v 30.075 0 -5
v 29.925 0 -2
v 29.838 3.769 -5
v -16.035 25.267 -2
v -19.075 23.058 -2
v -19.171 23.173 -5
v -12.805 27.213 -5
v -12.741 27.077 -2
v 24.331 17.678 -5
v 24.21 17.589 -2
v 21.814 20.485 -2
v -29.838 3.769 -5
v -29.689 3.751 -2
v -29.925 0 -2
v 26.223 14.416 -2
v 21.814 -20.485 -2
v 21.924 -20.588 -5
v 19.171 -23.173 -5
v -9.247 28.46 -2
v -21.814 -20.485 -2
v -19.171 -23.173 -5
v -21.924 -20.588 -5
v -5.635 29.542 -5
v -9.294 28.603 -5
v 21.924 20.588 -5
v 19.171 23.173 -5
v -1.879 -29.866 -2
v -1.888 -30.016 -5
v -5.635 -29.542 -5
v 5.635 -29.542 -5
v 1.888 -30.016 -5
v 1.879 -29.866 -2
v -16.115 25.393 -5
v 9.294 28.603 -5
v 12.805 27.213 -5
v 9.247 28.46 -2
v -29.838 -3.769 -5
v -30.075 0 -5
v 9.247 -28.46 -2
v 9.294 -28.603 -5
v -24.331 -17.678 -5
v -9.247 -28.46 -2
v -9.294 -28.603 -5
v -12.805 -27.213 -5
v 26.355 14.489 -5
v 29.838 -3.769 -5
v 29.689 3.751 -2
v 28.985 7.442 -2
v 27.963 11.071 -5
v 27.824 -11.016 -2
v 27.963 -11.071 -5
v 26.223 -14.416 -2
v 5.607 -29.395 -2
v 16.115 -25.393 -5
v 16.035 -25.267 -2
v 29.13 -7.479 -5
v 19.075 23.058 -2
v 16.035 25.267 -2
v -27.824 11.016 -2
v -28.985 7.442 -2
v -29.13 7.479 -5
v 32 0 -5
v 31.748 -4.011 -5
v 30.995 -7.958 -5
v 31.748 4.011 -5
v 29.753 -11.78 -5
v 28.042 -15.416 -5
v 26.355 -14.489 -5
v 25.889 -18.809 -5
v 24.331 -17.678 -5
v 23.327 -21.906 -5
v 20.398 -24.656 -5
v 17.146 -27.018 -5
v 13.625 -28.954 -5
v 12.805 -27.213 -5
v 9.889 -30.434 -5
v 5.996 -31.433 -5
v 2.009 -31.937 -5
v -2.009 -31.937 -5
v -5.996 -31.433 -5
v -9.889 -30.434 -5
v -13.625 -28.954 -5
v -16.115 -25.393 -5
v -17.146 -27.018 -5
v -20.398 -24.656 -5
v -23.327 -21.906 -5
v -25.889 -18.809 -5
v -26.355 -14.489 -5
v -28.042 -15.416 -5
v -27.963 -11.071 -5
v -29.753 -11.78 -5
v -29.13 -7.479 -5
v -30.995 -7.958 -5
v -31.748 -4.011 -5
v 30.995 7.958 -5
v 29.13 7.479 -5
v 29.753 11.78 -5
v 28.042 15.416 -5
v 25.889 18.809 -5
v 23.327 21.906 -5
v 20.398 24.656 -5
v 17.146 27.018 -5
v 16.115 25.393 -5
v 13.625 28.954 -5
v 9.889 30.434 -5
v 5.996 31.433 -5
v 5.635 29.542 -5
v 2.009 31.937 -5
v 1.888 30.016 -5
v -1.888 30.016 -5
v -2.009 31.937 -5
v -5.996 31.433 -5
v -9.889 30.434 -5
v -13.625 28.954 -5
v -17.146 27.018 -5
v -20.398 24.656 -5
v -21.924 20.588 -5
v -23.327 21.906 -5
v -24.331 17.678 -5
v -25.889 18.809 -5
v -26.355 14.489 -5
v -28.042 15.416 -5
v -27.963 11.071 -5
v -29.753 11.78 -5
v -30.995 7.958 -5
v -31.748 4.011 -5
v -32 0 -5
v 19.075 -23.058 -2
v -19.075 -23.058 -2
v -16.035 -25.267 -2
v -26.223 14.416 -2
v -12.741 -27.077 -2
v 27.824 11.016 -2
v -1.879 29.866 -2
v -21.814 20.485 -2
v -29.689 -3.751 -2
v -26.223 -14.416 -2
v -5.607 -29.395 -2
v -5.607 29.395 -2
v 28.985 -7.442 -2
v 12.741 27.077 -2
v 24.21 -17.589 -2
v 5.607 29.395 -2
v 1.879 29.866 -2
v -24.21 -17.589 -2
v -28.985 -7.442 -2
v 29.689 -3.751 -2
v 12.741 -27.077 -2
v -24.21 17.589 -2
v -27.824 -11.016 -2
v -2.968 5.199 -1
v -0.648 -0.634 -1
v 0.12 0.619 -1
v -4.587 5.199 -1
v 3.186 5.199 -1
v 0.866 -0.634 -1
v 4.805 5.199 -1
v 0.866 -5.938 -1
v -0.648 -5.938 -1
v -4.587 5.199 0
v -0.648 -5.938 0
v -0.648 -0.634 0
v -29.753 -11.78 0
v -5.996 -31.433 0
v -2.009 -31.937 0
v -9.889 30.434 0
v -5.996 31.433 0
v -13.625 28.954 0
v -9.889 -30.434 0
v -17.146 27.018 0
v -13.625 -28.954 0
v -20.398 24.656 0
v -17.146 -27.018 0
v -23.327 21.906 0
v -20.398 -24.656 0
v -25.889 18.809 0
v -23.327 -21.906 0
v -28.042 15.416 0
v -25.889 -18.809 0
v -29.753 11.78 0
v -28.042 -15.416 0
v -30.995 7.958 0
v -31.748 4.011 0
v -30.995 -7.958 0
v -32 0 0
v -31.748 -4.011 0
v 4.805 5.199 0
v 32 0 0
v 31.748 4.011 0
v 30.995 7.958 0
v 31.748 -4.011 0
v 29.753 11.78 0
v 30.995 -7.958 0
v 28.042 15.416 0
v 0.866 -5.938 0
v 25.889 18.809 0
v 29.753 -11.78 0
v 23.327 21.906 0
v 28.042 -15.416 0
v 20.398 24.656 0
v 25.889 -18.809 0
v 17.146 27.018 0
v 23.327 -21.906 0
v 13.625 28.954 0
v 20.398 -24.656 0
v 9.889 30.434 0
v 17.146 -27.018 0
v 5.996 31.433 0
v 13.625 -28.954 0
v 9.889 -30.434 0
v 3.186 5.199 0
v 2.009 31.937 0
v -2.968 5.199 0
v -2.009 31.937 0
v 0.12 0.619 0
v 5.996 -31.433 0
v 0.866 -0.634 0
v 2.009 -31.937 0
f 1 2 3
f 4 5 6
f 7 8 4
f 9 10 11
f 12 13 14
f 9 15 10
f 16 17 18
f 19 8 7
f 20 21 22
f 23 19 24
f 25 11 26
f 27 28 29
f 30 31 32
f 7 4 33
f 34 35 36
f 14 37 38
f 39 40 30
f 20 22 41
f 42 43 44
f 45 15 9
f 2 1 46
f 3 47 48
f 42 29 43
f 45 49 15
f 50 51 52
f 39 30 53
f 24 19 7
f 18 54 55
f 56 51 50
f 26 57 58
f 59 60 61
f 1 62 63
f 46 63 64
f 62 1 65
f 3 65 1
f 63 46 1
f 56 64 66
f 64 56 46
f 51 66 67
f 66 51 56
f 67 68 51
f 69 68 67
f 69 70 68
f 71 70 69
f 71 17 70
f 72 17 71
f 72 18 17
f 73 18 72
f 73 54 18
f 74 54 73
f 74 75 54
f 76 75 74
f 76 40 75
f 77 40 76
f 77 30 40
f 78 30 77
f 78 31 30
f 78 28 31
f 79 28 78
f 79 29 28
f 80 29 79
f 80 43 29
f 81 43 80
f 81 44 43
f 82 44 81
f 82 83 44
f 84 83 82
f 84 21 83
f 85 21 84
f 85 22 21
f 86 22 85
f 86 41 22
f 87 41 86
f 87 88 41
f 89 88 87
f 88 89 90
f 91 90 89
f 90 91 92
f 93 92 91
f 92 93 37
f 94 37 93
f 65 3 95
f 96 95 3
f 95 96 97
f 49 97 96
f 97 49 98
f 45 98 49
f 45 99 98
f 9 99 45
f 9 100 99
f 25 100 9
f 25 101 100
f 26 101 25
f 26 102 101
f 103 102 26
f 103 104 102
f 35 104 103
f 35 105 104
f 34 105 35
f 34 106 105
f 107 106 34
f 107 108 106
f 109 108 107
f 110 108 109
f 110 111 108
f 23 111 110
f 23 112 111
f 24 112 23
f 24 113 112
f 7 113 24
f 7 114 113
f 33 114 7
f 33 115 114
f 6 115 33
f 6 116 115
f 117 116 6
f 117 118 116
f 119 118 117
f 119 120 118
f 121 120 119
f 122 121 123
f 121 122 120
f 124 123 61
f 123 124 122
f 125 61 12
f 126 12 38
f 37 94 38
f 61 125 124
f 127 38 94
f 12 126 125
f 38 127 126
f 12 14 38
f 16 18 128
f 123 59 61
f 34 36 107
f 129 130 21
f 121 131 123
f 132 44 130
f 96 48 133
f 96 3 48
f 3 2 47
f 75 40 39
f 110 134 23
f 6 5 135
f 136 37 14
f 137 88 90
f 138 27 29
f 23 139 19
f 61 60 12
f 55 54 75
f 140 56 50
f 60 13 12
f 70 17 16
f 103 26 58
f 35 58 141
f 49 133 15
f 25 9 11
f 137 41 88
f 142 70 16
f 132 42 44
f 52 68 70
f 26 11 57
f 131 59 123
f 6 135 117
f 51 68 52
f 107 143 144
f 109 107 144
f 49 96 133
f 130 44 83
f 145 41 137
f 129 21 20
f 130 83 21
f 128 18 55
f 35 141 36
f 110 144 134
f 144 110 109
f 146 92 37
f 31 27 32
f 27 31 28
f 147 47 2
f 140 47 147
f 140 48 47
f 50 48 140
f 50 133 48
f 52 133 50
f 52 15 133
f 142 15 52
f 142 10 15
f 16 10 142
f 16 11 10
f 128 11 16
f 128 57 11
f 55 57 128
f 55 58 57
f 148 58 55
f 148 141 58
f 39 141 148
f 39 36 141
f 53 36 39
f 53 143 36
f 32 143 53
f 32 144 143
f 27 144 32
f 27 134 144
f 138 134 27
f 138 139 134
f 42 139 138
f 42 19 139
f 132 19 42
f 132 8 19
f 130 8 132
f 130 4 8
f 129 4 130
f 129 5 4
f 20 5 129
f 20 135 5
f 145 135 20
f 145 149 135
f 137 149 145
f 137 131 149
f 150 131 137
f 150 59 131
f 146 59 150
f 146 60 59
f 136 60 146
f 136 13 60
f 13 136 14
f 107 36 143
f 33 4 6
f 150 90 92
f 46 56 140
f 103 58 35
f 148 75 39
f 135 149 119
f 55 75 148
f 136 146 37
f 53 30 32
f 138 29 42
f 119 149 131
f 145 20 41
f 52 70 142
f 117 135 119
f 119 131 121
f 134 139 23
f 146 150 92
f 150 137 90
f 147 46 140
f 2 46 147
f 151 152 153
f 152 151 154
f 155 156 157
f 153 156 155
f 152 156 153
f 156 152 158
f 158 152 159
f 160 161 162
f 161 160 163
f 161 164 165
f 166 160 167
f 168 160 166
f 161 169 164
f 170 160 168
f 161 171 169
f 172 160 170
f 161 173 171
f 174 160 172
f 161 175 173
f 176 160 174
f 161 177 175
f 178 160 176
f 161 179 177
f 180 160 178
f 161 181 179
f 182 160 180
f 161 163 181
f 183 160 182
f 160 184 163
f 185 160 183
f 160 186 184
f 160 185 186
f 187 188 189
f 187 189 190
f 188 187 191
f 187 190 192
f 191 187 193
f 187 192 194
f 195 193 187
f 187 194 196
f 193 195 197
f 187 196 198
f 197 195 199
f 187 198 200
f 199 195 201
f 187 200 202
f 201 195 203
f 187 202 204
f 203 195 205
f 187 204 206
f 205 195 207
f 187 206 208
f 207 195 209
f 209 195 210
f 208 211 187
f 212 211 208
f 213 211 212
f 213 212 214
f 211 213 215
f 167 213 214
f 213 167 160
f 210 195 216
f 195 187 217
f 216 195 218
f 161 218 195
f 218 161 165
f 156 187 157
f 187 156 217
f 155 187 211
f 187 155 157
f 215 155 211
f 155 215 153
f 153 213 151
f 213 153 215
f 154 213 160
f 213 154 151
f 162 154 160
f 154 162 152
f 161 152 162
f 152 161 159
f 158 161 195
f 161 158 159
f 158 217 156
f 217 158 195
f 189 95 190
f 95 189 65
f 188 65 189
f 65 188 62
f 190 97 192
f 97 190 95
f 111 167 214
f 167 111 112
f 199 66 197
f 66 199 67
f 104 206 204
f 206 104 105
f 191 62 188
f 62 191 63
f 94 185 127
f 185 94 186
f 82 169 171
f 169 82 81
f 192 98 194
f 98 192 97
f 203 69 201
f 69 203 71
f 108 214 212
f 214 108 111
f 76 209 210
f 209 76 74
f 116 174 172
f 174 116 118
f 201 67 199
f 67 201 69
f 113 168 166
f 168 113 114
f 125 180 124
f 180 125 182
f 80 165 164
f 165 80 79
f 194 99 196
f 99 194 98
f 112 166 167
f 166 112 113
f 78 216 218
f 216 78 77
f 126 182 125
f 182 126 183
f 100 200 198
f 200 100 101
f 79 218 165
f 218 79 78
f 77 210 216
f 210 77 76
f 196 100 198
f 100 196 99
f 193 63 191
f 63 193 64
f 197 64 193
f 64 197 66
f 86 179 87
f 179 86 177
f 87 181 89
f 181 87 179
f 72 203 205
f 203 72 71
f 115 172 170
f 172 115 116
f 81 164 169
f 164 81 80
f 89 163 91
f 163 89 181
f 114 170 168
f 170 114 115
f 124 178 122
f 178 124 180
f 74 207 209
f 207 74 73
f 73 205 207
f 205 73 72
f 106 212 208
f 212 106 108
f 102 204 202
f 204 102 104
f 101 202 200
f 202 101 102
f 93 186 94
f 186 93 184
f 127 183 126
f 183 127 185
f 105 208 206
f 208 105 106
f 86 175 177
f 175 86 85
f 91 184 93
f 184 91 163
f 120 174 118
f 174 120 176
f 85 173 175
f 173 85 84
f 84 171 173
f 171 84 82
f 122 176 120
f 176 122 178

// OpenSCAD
$fn = 50;


difference() {
	union() {
		translate(v = [0, 0, -5.0000000000]) {
			cylinder(h = 5, r = 32.0000000000);
		}
	}
	union() {
		#translate(v = [0, 0, -5.0000000000]) {
			cylinder(h = 3, r1 = 30.0750000000, r2 = 29.9250000000);
		}
		translate(v = [0, -0.5000000000, -1]) {
			linear_extrude(height = 1) {
				text(font = "Webdings", halign = "center", size = 11, text = "Y", valign = "center");
			}
		}
	}
}
